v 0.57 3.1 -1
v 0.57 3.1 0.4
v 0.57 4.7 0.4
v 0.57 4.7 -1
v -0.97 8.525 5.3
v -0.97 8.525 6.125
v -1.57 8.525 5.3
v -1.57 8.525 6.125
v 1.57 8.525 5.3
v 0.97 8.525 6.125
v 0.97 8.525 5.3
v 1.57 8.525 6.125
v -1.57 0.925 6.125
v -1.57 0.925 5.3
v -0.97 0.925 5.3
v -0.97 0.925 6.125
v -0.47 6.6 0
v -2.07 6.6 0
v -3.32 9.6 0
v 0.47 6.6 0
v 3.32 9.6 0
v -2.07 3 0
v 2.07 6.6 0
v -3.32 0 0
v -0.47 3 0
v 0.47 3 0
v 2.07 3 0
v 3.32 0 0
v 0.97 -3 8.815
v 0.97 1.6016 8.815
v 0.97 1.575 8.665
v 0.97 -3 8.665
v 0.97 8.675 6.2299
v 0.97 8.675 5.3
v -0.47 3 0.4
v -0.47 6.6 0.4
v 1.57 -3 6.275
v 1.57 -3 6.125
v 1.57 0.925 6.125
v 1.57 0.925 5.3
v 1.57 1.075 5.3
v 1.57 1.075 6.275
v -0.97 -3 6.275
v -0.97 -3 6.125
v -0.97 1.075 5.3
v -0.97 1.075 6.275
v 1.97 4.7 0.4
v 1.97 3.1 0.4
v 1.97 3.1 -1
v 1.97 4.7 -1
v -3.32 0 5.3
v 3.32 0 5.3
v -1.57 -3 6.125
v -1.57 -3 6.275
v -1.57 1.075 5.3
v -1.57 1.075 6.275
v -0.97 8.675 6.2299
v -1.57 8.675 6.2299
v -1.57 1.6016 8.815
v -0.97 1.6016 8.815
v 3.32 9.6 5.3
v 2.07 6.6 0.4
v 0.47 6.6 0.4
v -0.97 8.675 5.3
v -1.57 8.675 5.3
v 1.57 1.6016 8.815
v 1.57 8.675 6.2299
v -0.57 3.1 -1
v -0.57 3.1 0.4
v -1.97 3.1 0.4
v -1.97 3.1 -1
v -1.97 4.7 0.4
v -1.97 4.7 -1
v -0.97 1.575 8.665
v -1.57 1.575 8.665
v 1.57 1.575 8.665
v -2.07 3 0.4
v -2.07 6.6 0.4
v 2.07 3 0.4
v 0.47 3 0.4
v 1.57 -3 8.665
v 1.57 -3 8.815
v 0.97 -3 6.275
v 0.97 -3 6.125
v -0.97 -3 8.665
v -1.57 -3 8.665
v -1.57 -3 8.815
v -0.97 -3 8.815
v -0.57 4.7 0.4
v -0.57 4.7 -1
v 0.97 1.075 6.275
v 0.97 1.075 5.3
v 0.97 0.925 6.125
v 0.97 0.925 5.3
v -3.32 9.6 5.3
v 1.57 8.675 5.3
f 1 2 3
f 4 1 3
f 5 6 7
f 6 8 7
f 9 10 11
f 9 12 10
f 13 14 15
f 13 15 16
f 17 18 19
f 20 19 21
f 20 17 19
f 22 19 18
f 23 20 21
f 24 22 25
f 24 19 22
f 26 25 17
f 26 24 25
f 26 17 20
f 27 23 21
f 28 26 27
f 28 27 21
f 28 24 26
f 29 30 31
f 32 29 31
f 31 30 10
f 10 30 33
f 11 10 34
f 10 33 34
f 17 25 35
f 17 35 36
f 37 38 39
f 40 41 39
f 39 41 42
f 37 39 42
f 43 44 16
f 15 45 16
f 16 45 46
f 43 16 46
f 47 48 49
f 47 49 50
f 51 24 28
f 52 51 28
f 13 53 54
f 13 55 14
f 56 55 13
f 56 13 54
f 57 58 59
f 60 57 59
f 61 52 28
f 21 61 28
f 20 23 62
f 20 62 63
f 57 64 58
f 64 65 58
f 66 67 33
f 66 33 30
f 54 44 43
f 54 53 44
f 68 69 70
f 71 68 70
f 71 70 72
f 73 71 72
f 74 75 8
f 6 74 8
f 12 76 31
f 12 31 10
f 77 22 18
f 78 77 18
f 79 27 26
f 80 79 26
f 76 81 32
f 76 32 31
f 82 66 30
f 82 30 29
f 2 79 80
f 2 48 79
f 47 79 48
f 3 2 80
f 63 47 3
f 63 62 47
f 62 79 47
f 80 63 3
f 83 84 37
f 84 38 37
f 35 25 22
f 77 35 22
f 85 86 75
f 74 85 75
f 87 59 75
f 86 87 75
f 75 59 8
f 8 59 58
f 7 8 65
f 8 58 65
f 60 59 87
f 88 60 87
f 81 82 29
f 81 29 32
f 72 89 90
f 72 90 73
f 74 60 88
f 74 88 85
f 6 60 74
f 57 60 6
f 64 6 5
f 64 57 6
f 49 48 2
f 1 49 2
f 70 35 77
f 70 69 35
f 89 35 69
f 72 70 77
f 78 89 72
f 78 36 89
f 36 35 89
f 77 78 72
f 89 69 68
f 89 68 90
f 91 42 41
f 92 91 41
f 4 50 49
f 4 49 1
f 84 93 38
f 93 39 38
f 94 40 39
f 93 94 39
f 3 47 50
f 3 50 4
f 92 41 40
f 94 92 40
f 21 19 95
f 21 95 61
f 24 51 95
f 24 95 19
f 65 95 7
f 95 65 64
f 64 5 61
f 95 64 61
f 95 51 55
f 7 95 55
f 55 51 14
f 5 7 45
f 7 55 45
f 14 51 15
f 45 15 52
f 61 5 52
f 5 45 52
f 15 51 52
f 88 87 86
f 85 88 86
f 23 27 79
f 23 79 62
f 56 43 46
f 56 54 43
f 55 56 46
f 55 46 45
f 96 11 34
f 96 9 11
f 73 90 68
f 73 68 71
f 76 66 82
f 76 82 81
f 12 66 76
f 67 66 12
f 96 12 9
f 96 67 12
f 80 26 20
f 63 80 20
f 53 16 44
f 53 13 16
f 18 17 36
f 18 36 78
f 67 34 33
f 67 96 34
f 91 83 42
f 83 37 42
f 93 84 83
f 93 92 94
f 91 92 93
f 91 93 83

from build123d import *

# Parameters (mm, degrees)
SKETCH1_W             = 6.64
SKETCH1_H             = 5.3
BOSS_EXTRUDE1_DEPTH   = 9.6
SKETCH2_W             = 1.6
SKETCH2_H             = 3.6
CUT_EXTRUDE1_DEPTH    = 0.4
SKETCH3_W             = 1.4
SKETCH3_H             = 1.6
BOSS_EXTRUDE3_DEPTH   = 1.4
BOSS_EXTRUDE4_DEPTH   = 0.3
BOSS_EXTRUDE4_2_DEPTH = 0.3


with BuildPart() as part:
    # Sketch1 → Boss-Extrude1 (new body)
    with BuildSketch(Plane(origin=(0, 0, 0), x_dir=(1, 0, 0), z_dir=(0, 1, 0))):
        with Locations((0, -2.65)):
            Rectangle(SKETCH1_W, SKETCH1_H)
    extrude(amount=BOSS_EXTRUDE1_DEPTH)

    # Sketch2 → Cut-Extrude1 (cut)
    with BuildSketch(Plane(origin=(0, 0, 0), x_dir=(-1, 0, 0), z_dir=(0, 0, -1))):
        with Locations((-1.27, 4.8)):
            Rectangle(SKETCH2_W, SKETCH2_H)
        with Locations((1.27, 4.8)):
            Rectangle(SKETCH2_W, SKETCH2_H)
    extrude(amount=-CUT_EXTRUDE1_DEPTH, mode=Mode.SUBTRACT)

    # Sketch3 → Boss-Extrude3 (add)
    with BuildSketch(Plane(origin=(0, 0, 0.4), x_dir=(-1, 0, 0), z_dir=(0, 0, -1))):
        with Locations((-1.27, 3.9)):
            Rectangle(SKETCH3_W, SKETCH3_H)
        with Locations((1.27, 3.9)):
            Rectangle(SKETCH3_W, SKETCH3_H)
    extrude(amount=BOSS_EXTRUDE3_DEPTH)


with BuildPart() as body_2:
    # Sketch4 → Boss-Extrude4 (new, symmetric)
    with BuildSketch(Plane(origin=(1.27, 0, 0), x_dir=(0, 0, -1), z_dir=(1, 0, 0))):
        Polygon((-5.3, 8.675), (-6.229883482, 8.675), (-8.815, 1.60155126), (-8.815, -3), (-8.665, -3), (-8.665, 1.575), (-6.125, 8.525), (-5.3, 8.525), align=None)
    boss_extrude4 = extrude(amount=BOSS_EXTRUDE4_DEPTH, both=True)


with BuildPart() as body_3:
    # Sketch4 → Boss-Extrude4 2 (new, symmetric)
    with BuildSketch(Plane(origin=(1.27, 0, 0), x_dir=(0, 0, -1), z_dir=(1, 0, 0))):
        Polygon((-5.3, 0.925), (-6.125, 0.925), (-6.125, -3), (-6.275, -3), (-6.275, 1.075), (-5.3, 1.075), align=None)
    boss_extrude4_2 = extrude(amount=BOSS_EXTRUDE4_2_DEPTH, both=True)


with BuildPart() as part_1:
    add(part.part)

    # Mirror1: Boss-Extrude4, Boss-Extrude4 2 across plane
    add(boss_extrude4.mirror(Plane(origin=(0, 0, 0), x_dir=(0, 0, 1), z_dir=(1, 0, 0))))
    add(boss_extrude4_2.mirror(Plane(origin=(0, 0, 0), x_dir=(0, 0, 1), z_dir=(1, 0, 0))))


solid = Compound([body_2.part, body_3.part, part_1.part])
